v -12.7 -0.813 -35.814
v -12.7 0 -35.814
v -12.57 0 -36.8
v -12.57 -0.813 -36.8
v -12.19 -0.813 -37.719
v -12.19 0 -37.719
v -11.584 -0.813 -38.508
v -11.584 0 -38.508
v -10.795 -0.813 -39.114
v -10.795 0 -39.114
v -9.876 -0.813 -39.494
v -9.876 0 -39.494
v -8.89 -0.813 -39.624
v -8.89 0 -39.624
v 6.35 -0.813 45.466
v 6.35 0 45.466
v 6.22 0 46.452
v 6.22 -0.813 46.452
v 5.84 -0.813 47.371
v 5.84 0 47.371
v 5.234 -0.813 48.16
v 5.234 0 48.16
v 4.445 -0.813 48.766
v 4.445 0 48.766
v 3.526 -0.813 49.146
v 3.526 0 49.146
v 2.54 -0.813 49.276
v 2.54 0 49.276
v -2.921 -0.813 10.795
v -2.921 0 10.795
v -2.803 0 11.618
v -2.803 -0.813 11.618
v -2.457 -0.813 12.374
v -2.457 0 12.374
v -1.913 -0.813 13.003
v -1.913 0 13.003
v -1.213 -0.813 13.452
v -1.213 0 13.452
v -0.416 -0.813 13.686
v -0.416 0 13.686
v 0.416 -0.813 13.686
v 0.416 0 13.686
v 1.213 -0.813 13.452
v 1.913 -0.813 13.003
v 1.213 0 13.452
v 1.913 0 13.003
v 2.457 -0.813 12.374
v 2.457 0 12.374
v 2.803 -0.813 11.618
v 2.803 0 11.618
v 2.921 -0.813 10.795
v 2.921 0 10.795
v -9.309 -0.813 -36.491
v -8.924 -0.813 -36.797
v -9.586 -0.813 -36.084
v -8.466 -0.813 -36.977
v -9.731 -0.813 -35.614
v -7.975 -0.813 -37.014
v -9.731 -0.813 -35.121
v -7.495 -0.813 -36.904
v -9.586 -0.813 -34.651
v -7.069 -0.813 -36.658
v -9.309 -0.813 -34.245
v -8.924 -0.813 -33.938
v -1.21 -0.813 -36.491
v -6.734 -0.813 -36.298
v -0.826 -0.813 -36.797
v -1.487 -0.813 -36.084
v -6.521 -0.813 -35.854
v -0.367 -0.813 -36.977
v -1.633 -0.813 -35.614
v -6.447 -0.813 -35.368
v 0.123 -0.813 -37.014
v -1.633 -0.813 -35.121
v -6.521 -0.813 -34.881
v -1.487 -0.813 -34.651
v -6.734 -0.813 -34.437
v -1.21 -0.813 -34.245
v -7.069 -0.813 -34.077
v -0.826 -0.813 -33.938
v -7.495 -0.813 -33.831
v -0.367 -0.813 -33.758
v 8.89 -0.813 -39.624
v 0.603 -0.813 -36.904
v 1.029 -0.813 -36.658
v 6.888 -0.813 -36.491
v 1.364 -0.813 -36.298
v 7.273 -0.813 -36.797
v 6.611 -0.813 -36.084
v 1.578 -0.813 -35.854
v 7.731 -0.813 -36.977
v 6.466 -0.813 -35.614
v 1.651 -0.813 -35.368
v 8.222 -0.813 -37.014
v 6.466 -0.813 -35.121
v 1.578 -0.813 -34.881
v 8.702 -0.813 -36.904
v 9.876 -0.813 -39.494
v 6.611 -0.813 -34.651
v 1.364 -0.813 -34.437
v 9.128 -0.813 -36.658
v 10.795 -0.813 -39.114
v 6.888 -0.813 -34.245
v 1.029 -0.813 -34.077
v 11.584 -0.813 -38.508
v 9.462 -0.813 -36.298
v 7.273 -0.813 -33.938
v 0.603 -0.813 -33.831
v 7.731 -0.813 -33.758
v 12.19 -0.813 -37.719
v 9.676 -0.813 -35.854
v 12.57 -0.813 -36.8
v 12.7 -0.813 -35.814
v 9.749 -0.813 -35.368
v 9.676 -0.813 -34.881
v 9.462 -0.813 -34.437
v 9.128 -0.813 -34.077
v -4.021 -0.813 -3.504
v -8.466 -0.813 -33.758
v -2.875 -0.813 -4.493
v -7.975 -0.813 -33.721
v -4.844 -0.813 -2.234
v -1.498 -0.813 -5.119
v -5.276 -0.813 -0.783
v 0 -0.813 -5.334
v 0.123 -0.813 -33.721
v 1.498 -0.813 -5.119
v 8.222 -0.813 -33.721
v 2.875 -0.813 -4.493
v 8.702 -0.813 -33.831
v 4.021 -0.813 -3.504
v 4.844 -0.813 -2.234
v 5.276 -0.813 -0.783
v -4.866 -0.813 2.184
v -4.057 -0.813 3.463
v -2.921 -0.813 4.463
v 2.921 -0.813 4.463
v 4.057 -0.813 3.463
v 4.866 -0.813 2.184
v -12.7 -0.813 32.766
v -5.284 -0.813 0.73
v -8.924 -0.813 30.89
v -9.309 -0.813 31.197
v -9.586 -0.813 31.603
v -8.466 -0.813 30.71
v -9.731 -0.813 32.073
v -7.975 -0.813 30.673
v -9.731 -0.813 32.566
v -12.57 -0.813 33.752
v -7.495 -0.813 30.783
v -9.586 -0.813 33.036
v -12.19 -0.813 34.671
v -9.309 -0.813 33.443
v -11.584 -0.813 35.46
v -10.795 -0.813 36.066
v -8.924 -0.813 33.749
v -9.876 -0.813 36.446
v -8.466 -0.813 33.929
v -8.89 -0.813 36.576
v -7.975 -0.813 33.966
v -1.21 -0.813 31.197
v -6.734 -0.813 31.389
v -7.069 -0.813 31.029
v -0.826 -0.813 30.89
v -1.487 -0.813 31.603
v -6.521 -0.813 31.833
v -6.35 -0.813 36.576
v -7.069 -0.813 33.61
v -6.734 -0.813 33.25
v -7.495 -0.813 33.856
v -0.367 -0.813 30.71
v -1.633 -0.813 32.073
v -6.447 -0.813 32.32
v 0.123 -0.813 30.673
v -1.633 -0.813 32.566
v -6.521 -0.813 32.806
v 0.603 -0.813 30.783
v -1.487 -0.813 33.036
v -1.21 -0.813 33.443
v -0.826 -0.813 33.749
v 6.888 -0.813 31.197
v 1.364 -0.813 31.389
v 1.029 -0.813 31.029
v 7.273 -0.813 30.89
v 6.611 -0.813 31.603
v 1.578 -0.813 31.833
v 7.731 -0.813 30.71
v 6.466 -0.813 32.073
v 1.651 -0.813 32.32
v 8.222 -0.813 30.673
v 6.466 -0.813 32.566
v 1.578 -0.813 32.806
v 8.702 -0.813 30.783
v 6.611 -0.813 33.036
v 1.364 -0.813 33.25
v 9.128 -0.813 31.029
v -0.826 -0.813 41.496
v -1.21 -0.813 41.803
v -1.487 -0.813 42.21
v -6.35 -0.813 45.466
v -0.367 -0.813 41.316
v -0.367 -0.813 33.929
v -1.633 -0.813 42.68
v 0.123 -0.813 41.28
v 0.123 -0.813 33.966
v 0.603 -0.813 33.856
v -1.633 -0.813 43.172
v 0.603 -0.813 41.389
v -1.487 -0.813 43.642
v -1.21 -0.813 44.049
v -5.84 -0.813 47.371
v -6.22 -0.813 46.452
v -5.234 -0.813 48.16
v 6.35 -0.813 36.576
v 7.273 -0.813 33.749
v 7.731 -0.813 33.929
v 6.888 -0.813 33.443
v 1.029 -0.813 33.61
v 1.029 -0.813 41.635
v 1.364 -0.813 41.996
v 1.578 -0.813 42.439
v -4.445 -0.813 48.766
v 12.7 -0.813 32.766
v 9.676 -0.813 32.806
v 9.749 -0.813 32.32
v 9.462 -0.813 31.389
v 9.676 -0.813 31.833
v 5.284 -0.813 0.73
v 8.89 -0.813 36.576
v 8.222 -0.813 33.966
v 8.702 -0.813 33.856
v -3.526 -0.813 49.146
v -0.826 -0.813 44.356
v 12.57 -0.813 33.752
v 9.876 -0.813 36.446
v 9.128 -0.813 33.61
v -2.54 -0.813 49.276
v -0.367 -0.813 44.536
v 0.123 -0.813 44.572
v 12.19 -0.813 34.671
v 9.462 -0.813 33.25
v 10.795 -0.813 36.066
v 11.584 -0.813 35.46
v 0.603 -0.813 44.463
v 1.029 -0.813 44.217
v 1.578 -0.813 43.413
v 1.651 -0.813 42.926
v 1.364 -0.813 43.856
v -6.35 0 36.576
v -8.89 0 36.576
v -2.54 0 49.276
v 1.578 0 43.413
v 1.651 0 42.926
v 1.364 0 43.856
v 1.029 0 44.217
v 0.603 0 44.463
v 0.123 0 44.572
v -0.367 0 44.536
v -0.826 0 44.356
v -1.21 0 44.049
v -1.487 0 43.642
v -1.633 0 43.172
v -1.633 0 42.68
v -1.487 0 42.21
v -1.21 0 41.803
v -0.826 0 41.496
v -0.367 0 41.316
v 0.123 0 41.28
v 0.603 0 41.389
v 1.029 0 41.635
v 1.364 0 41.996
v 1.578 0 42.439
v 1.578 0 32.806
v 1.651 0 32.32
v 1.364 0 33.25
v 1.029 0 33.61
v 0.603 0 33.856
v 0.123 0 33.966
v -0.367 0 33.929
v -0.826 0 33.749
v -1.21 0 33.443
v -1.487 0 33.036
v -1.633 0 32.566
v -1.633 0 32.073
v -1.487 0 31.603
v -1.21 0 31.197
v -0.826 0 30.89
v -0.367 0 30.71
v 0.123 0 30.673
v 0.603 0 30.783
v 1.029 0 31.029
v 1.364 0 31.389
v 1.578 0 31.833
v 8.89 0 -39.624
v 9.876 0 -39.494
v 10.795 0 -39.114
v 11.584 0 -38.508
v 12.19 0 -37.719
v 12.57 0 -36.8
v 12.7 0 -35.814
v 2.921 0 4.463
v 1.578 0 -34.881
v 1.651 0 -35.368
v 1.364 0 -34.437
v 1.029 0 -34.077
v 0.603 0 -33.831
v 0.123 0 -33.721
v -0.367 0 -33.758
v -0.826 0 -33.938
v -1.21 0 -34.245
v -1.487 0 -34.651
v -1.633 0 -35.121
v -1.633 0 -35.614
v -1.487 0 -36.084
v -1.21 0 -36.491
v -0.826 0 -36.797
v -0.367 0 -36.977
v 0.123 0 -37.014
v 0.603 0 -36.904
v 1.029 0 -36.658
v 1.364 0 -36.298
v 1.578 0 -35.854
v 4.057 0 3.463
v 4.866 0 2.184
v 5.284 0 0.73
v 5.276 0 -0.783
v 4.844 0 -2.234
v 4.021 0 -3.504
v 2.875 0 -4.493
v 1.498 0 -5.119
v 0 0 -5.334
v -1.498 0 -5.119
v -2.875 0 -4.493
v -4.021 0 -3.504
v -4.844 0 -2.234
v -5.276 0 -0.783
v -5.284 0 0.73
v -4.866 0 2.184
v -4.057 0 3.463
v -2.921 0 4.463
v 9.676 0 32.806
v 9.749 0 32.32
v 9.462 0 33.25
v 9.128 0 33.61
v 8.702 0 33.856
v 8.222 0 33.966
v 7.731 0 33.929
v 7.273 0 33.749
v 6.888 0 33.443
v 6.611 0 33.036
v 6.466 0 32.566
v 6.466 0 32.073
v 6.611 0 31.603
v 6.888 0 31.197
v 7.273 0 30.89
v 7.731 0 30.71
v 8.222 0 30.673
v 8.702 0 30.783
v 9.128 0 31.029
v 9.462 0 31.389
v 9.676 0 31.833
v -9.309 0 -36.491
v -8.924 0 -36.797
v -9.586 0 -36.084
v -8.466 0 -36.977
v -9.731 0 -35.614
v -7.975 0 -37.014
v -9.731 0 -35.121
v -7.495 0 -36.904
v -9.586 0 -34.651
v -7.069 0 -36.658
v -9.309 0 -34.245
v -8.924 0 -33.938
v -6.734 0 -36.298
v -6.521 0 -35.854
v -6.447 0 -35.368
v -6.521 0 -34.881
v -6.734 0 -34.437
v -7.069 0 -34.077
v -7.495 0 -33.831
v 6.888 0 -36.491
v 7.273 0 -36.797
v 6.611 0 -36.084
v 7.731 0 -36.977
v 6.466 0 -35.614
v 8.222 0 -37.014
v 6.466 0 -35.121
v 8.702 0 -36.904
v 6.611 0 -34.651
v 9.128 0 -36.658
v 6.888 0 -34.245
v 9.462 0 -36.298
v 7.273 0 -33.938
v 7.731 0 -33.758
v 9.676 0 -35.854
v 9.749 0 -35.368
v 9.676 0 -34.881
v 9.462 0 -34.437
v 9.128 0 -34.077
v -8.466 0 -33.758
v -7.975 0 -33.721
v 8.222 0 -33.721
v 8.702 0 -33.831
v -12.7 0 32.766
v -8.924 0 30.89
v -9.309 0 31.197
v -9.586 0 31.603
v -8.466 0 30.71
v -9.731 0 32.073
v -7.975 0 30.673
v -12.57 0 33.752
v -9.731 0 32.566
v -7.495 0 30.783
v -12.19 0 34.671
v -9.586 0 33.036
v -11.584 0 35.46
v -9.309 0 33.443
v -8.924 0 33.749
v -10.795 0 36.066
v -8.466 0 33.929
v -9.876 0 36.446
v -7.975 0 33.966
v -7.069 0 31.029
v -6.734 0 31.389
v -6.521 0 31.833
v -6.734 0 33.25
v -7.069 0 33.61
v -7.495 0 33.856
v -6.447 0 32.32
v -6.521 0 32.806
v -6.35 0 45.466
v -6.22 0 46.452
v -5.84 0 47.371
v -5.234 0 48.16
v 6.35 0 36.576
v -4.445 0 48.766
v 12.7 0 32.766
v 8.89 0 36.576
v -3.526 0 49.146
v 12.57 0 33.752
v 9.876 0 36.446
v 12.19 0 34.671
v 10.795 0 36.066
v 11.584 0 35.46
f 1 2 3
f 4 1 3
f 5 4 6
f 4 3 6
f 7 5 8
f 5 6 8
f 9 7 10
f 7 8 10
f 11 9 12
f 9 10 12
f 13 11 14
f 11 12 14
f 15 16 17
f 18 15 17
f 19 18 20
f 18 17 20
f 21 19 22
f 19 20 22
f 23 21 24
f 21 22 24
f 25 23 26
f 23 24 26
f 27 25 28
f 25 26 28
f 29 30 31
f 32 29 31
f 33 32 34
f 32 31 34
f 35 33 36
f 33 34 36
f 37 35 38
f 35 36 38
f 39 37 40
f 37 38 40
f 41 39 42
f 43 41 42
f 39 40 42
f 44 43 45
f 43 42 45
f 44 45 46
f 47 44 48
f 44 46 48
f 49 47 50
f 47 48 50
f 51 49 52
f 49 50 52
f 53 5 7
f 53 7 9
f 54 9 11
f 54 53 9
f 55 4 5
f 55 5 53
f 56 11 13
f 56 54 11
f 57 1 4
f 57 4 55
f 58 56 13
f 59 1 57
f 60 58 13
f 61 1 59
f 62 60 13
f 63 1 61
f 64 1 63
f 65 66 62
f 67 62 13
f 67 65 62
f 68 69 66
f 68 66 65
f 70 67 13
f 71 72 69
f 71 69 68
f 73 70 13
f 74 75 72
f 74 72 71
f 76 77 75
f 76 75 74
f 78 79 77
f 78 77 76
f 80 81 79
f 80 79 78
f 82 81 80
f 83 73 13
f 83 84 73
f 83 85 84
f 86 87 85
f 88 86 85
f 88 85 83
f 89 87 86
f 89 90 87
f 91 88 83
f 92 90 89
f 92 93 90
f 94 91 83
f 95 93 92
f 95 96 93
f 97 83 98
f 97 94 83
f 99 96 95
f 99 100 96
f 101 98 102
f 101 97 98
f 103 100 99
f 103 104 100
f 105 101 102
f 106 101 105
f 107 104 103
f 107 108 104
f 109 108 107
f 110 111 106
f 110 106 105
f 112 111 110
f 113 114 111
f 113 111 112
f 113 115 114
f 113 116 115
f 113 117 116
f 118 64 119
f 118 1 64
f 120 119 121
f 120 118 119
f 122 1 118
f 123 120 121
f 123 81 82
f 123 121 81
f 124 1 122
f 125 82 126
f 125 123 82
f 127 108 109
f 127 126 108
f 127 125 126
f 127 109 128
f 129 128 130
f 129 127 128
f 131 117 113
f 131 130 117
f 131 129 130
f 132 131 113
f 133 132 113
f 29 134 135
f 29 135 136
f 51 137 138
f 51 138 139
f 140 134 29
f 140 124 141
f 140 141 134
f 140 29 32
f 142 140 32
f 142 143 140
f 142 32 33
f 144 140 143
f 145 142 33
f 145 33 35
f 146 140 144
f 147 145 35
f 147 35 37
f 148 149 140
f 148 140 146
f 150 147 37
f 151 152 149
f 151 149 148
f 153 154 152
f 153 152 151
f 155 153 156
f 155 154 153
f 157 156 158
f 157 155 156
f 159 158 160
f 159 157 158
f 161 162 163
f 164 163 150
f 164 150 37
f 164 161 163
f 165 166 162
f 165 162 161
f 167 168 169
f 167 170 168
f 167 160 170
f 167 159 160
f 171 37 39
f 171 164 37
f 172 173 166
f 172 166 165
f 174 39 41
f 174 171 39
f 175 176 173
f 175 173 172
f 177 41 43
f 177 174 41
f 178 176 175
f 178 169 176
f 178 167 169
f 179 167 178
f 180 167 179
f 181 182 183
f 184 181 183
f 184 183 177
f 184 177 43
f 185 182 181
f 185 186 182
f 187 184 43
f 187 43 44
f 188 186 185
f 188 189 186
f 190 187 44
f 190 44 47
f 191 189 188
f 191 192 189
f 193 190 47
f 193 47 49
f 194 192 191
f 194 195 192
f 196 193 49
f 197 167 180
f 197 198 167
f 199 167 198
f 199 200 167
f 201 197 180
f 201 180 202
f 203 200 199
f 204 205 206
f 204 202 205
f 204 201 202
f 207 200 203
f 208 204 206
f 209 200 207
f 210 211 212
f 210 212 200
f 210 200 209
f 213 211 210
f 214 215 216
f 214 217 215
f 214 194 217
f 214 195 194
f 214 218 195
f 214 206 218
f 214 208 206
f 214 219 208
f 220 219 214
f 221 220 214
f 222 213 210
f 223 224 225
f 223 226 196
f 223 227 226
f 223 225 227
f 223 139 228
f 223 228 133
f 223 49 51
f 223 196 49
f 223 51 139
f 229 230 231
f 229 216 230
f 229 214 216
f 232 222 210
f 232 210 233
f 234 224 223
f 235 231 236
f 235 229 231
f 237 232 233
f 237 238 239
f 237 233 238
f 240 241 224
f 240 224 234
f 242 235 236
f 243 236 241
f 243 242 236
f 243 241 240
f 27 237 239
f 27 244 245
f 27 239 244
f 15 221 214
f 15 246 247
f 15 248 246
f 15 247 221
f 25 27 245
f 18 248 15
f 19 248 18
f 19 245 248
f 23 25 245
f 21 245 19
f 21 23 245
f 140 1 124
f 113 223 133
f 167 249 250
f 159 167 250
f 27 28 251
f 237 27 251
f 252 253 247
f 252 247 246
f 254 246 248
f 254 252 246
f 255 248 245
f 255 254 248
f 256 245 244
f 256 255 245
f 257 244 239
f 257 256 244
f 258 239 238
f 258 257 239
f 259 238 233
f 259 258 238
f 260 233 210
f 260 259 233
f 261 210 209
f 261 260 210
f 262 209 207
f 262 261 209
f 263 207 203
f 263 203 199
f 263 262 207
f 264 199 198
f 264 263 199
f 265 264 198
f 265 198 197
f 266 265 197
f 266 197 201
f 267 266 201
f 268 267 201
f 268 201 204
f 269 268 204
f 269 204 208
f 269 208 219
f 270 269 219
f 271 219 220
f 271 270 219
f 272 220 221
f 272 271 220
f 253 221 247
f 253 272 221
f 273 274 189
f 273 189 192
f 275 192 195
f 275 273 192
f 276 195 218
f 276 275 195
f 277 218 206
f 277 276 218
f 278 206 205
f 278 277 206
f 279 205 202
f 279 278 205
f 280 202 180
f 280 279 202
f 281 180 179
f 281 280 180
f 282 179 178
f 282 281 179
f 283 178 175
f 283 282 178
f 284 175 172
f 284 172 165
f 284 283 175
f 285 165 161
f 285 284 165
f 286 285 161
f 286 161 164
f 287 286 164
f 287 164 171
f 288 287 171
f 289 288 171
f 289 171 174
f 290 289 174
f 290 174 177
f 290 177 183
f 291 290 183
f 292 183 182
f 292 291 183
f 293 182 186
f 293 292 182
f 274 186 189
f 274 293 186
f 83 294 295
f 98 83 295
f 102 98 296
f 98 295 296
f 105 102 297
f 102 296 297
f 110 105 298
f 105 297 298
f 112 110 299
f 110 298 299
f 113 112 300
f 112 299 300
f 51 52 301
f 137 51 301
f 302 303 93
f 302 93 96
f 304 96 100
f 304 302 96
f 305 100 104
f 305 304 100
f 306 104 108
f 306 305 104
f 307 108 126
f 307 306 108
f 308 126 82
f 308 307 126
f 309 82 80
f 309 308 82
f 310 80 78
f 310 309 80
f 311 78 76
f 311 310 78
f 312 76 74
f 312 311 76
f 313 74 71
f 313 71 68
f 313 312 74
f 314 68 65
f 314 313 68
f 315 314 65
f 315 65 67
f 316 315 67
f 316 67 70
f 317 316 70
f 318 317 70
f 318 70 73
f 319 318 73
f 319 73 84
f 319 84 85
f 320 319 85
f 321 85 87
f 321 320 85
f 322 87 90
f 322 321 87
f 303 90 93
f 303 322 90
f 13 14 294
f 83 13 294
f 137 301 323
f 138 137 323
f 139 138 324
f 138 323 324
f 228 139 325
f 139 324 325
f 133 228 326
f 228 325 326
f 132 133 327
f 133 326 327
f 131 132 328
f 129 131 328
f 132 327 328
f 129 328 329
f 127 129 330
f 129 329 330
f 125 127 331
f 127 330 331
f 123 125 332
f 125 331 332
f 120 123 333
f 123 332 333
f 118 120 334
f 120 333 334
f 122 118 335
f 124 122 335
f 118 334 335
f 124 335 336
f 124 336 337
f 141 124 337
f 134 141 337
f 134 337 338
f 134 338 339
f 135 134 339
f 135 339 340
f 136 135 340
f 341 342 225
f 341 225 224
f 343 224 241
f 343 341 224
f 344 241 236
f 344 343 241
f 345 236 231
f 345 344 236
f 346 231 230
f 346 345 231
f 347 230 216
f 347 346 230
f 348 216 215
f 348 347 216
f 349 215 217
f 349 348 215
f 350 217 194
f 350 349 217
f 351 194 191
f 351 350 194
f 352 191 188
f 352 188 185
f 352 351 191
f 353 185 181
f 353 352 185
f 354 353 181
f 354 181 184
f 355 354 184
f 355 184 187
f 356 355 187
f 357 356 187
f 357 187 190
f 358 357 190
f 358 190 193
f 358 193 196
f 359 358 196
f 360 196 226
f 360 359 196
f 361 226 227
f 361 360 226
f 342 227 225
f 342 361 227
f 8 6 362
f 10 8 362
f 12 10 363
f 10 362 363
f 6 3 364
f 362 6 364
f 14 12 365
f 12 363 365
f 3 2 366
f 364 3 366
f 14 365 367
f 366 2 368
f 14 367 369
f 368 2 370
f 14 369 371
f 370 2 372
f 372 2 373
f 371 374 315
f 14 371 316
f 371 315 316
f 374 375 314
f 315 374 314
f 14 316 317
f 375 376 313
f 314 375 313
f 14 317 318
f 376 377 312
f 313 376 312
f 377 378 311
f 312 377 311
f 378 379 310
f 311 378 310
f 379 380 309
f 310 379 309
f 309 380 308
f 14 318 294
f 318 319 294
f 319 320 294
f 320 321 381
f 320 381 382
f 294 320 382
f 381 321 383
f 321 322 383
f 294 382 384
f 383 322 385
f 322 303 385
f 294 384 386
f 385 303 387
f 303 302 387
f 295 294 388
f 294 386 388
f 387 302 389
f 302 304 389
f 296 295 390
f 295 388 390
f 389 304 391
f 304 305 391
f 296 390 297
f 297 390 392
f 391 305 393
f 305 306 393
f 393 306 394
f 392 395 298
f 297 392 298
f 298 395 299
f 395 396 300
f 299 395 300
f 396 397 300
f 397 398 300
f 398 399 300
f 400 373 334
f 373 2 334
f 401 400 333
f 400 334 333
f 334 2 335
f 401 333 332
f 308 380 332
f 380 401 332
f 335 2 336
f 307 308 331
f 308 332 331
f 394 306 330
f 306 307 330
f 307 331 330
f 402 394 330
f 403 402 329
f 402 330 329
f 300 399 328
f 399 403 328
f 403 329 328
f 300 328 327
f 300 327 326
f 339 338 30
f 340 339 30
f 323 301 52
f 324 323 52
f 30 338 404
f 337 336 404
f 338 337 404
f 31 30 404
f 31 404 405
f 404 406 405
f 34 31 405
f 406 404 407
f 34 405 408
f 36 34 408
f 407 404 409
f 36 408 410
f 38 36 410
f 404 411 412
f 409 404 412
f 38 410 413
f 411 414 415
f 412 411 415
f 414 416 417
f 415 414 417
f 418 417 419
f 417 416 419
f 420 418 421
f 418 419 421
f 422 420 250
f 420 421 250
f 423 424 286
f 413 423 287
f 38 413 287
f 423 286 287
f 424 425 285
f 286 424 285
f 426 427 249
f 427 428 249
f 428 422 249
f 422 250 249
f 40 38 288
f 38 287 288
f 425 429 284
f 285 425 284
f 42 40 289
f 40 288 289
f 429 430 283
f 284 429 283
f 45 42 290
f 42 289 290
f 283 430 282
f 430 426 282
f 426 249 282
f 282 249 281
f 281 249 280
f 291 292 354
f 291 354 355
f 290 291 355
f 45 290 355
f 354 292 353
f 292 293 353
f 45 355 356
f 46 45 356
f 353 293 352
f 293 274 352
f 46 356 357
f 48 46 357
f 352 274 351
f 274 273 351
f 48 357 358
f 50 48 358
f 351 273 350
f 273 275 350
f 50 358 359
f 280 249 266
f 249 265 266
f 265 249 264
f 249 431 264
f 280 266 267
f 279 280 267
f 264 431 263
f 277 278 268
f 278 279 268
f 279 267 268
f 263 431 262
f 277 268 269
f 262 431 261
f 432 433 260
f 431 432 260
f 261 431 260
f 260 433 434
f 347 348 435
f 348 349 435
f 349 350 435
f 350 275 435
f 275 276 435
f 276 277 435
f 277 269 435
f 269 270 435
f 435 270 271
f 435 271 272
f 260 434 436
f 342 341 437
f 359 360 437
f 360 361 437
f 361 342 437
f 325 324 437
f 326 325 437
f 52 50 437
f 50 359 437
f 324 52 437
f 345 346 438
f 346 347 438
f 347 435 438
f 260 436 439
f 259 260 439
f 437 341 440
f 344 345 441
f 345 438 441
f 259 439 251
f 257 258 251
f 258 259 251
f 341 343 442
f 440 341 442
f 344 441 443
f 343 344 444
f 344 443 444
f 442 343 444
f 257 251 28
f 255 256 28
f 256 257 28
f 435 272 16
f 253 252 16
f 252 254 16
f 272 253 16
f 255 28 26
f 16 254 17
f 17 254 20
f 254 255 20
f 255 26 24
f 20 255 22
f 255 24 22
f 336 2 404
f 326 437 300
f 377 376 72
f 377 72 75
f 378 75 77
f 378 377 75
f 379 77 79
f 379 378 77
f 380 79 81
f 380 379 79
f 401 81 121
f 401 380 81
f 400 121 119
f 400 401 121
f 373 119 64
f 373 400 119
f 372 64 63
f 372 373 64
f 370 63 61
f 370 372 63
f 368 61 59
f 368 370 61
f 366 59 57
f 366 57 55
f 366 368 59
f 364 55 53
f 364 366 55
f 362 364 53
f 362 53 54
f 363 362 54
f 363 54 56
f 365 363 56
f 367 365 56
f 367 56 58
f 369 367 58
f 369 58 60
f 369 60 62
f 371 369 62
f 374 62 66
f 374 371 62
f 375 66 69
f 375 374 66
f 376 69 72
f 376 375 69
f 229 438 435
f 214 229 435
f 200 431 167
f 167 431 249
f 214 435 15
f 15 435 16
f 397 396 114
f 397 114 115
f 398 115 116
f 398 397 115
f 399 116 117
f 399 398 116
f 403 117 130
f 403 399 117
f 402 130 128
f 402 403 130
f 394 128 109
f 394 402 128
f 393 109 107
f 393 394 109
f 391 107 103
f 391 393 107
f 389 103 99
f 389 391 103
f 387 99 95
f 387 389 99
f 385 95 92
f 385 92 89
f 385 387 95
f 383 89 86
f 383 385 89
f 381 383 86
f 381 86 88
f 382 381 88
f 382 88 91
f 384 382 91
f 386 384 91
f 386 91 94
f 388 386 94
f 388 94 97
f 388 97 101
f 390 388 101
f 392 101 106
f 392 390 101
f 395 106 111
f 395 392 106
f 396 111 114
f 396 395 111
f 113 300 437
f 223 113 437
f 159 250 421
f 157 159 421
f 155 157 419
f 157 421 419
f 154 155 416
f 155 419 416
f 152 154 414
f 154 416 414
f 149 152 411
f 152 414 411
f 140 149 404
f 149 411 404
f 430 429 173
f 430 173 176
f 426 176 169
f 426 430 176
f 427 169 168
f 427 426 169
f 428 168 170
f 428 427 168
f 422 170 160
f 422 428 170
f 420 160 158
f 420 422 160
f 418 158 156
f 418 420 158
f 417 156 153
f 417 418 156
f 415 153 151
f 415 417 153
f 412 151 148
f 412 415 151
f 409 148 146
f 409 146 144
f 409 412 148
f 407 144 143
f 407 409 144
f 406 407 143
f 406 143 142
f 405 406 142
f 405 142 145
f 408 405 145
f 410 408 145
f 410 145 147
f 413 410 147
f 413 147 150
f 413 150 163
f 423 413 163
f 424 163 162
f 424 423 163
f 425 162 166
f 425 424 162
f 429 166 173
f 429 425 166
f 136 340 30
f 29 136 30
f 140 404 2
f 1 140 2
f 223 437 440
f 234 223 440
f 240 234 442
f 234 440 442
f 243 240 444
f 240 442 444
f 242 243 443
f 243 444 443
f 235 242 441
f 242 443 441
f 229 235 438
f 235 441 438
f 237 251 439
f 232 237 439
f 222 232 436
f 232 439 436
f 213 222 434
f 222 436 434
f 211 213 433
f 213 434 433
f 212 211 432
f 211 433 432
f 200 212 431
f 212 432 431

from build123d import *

# Parameters (mm, degrees)
F0_R     = 1.651
F1_DEPTH = 0.8128


with BuildPart() as f1:
    # F0 (on Front) → F1 (new body)
    with BuildSketch(Plane.XZ):
        with BuildLine():
            Line((-6.35, 36.576), (-8.89, 36.576))
            ThreePointArc((-8.89, 36.576), (-11.584077, 35.460077), (-12.7, 32.766))
            Line((-12.7, 32.766), (-12.7, -35.814))
            ThreePointArc((-12.7, -35.814), (-11.584077, -38.508077), (-8.89, -39.624))
            Line((-8.89, -39.624), (8.89, -39.624))
            ThreePointArc((8.89, -39.624), (11.584077, -38.508077), (12.7, -35.814))
            Line((12.7, -35.814), (12.7, 32.766))
            ThreePointArc((12.7, 32.766), (11.584077, 35.460077), (8.89, 36.576))
            Line((8.89, 36.576), (6.35, 36.576))
            Line((6.35, 36.576), (-6.35, 36.576))
        make_face()
        with Locations((-8.098364, -35.367535)):
            Circle(F0_R, mode=Mode.SUBTRACT)
        with Locations((0, -35.367535)):
            Circle(F0_R, mode=Mode.SUBTRACT)
        with Locations((8.098364, -35.367535)):
            Circle(F0_R, mode=Mode.SUBTRACT)
        with BuildLine():
            ThreePointArc((2.921, 4.463106), (0, -5.334), (-2.921, 4.463106))
            Line((-2.921, 4.463106), (-2.921, 10.795))
            ThreePointArc((-2.921, 10.795), (0, 13.716), (2.921, 10.795))
            Line((2.921, 10.795), (2.921, 4.463106))
        make_face(mode=Mode.SUBTRACT)
        with Locations((-8.098364, 32.319535)):
            Circle(F0_R, mode=Mode.SUBTRACT)
        with Locations((0, 32.319535)):
            Circle(F0_R, mode=Mode.SUBTRACT)
        with Locations((8.098364, 32.319535)):
            Circle(F0_R, mode=Mode.SUBTRACT)
        with BuildLine():
            Line((-6.35, 45.466), (-6.35, 36.576))
            Line((-6.35, 36.576), (6.35, 36.576))
            Line((6.35, 36.576), (6.35, 45.466))
            ThreePointArc((6.35, 45.466), (5.234077, 48.160077), (2.54, 49.276))
            Line((2.54, 49.276), (-2.54, 49.276))
            ThreePointArc((-2.54, 49.276), (-5.234077, 48.160077), (-6.35, 45.466))
        make_face()
        with Locations((0, 42.926)):
            Circle(F0_R, mode=Mode.SUBTRACT)
    extrude(amount=F1_DEPTH)


solid = f1.part
